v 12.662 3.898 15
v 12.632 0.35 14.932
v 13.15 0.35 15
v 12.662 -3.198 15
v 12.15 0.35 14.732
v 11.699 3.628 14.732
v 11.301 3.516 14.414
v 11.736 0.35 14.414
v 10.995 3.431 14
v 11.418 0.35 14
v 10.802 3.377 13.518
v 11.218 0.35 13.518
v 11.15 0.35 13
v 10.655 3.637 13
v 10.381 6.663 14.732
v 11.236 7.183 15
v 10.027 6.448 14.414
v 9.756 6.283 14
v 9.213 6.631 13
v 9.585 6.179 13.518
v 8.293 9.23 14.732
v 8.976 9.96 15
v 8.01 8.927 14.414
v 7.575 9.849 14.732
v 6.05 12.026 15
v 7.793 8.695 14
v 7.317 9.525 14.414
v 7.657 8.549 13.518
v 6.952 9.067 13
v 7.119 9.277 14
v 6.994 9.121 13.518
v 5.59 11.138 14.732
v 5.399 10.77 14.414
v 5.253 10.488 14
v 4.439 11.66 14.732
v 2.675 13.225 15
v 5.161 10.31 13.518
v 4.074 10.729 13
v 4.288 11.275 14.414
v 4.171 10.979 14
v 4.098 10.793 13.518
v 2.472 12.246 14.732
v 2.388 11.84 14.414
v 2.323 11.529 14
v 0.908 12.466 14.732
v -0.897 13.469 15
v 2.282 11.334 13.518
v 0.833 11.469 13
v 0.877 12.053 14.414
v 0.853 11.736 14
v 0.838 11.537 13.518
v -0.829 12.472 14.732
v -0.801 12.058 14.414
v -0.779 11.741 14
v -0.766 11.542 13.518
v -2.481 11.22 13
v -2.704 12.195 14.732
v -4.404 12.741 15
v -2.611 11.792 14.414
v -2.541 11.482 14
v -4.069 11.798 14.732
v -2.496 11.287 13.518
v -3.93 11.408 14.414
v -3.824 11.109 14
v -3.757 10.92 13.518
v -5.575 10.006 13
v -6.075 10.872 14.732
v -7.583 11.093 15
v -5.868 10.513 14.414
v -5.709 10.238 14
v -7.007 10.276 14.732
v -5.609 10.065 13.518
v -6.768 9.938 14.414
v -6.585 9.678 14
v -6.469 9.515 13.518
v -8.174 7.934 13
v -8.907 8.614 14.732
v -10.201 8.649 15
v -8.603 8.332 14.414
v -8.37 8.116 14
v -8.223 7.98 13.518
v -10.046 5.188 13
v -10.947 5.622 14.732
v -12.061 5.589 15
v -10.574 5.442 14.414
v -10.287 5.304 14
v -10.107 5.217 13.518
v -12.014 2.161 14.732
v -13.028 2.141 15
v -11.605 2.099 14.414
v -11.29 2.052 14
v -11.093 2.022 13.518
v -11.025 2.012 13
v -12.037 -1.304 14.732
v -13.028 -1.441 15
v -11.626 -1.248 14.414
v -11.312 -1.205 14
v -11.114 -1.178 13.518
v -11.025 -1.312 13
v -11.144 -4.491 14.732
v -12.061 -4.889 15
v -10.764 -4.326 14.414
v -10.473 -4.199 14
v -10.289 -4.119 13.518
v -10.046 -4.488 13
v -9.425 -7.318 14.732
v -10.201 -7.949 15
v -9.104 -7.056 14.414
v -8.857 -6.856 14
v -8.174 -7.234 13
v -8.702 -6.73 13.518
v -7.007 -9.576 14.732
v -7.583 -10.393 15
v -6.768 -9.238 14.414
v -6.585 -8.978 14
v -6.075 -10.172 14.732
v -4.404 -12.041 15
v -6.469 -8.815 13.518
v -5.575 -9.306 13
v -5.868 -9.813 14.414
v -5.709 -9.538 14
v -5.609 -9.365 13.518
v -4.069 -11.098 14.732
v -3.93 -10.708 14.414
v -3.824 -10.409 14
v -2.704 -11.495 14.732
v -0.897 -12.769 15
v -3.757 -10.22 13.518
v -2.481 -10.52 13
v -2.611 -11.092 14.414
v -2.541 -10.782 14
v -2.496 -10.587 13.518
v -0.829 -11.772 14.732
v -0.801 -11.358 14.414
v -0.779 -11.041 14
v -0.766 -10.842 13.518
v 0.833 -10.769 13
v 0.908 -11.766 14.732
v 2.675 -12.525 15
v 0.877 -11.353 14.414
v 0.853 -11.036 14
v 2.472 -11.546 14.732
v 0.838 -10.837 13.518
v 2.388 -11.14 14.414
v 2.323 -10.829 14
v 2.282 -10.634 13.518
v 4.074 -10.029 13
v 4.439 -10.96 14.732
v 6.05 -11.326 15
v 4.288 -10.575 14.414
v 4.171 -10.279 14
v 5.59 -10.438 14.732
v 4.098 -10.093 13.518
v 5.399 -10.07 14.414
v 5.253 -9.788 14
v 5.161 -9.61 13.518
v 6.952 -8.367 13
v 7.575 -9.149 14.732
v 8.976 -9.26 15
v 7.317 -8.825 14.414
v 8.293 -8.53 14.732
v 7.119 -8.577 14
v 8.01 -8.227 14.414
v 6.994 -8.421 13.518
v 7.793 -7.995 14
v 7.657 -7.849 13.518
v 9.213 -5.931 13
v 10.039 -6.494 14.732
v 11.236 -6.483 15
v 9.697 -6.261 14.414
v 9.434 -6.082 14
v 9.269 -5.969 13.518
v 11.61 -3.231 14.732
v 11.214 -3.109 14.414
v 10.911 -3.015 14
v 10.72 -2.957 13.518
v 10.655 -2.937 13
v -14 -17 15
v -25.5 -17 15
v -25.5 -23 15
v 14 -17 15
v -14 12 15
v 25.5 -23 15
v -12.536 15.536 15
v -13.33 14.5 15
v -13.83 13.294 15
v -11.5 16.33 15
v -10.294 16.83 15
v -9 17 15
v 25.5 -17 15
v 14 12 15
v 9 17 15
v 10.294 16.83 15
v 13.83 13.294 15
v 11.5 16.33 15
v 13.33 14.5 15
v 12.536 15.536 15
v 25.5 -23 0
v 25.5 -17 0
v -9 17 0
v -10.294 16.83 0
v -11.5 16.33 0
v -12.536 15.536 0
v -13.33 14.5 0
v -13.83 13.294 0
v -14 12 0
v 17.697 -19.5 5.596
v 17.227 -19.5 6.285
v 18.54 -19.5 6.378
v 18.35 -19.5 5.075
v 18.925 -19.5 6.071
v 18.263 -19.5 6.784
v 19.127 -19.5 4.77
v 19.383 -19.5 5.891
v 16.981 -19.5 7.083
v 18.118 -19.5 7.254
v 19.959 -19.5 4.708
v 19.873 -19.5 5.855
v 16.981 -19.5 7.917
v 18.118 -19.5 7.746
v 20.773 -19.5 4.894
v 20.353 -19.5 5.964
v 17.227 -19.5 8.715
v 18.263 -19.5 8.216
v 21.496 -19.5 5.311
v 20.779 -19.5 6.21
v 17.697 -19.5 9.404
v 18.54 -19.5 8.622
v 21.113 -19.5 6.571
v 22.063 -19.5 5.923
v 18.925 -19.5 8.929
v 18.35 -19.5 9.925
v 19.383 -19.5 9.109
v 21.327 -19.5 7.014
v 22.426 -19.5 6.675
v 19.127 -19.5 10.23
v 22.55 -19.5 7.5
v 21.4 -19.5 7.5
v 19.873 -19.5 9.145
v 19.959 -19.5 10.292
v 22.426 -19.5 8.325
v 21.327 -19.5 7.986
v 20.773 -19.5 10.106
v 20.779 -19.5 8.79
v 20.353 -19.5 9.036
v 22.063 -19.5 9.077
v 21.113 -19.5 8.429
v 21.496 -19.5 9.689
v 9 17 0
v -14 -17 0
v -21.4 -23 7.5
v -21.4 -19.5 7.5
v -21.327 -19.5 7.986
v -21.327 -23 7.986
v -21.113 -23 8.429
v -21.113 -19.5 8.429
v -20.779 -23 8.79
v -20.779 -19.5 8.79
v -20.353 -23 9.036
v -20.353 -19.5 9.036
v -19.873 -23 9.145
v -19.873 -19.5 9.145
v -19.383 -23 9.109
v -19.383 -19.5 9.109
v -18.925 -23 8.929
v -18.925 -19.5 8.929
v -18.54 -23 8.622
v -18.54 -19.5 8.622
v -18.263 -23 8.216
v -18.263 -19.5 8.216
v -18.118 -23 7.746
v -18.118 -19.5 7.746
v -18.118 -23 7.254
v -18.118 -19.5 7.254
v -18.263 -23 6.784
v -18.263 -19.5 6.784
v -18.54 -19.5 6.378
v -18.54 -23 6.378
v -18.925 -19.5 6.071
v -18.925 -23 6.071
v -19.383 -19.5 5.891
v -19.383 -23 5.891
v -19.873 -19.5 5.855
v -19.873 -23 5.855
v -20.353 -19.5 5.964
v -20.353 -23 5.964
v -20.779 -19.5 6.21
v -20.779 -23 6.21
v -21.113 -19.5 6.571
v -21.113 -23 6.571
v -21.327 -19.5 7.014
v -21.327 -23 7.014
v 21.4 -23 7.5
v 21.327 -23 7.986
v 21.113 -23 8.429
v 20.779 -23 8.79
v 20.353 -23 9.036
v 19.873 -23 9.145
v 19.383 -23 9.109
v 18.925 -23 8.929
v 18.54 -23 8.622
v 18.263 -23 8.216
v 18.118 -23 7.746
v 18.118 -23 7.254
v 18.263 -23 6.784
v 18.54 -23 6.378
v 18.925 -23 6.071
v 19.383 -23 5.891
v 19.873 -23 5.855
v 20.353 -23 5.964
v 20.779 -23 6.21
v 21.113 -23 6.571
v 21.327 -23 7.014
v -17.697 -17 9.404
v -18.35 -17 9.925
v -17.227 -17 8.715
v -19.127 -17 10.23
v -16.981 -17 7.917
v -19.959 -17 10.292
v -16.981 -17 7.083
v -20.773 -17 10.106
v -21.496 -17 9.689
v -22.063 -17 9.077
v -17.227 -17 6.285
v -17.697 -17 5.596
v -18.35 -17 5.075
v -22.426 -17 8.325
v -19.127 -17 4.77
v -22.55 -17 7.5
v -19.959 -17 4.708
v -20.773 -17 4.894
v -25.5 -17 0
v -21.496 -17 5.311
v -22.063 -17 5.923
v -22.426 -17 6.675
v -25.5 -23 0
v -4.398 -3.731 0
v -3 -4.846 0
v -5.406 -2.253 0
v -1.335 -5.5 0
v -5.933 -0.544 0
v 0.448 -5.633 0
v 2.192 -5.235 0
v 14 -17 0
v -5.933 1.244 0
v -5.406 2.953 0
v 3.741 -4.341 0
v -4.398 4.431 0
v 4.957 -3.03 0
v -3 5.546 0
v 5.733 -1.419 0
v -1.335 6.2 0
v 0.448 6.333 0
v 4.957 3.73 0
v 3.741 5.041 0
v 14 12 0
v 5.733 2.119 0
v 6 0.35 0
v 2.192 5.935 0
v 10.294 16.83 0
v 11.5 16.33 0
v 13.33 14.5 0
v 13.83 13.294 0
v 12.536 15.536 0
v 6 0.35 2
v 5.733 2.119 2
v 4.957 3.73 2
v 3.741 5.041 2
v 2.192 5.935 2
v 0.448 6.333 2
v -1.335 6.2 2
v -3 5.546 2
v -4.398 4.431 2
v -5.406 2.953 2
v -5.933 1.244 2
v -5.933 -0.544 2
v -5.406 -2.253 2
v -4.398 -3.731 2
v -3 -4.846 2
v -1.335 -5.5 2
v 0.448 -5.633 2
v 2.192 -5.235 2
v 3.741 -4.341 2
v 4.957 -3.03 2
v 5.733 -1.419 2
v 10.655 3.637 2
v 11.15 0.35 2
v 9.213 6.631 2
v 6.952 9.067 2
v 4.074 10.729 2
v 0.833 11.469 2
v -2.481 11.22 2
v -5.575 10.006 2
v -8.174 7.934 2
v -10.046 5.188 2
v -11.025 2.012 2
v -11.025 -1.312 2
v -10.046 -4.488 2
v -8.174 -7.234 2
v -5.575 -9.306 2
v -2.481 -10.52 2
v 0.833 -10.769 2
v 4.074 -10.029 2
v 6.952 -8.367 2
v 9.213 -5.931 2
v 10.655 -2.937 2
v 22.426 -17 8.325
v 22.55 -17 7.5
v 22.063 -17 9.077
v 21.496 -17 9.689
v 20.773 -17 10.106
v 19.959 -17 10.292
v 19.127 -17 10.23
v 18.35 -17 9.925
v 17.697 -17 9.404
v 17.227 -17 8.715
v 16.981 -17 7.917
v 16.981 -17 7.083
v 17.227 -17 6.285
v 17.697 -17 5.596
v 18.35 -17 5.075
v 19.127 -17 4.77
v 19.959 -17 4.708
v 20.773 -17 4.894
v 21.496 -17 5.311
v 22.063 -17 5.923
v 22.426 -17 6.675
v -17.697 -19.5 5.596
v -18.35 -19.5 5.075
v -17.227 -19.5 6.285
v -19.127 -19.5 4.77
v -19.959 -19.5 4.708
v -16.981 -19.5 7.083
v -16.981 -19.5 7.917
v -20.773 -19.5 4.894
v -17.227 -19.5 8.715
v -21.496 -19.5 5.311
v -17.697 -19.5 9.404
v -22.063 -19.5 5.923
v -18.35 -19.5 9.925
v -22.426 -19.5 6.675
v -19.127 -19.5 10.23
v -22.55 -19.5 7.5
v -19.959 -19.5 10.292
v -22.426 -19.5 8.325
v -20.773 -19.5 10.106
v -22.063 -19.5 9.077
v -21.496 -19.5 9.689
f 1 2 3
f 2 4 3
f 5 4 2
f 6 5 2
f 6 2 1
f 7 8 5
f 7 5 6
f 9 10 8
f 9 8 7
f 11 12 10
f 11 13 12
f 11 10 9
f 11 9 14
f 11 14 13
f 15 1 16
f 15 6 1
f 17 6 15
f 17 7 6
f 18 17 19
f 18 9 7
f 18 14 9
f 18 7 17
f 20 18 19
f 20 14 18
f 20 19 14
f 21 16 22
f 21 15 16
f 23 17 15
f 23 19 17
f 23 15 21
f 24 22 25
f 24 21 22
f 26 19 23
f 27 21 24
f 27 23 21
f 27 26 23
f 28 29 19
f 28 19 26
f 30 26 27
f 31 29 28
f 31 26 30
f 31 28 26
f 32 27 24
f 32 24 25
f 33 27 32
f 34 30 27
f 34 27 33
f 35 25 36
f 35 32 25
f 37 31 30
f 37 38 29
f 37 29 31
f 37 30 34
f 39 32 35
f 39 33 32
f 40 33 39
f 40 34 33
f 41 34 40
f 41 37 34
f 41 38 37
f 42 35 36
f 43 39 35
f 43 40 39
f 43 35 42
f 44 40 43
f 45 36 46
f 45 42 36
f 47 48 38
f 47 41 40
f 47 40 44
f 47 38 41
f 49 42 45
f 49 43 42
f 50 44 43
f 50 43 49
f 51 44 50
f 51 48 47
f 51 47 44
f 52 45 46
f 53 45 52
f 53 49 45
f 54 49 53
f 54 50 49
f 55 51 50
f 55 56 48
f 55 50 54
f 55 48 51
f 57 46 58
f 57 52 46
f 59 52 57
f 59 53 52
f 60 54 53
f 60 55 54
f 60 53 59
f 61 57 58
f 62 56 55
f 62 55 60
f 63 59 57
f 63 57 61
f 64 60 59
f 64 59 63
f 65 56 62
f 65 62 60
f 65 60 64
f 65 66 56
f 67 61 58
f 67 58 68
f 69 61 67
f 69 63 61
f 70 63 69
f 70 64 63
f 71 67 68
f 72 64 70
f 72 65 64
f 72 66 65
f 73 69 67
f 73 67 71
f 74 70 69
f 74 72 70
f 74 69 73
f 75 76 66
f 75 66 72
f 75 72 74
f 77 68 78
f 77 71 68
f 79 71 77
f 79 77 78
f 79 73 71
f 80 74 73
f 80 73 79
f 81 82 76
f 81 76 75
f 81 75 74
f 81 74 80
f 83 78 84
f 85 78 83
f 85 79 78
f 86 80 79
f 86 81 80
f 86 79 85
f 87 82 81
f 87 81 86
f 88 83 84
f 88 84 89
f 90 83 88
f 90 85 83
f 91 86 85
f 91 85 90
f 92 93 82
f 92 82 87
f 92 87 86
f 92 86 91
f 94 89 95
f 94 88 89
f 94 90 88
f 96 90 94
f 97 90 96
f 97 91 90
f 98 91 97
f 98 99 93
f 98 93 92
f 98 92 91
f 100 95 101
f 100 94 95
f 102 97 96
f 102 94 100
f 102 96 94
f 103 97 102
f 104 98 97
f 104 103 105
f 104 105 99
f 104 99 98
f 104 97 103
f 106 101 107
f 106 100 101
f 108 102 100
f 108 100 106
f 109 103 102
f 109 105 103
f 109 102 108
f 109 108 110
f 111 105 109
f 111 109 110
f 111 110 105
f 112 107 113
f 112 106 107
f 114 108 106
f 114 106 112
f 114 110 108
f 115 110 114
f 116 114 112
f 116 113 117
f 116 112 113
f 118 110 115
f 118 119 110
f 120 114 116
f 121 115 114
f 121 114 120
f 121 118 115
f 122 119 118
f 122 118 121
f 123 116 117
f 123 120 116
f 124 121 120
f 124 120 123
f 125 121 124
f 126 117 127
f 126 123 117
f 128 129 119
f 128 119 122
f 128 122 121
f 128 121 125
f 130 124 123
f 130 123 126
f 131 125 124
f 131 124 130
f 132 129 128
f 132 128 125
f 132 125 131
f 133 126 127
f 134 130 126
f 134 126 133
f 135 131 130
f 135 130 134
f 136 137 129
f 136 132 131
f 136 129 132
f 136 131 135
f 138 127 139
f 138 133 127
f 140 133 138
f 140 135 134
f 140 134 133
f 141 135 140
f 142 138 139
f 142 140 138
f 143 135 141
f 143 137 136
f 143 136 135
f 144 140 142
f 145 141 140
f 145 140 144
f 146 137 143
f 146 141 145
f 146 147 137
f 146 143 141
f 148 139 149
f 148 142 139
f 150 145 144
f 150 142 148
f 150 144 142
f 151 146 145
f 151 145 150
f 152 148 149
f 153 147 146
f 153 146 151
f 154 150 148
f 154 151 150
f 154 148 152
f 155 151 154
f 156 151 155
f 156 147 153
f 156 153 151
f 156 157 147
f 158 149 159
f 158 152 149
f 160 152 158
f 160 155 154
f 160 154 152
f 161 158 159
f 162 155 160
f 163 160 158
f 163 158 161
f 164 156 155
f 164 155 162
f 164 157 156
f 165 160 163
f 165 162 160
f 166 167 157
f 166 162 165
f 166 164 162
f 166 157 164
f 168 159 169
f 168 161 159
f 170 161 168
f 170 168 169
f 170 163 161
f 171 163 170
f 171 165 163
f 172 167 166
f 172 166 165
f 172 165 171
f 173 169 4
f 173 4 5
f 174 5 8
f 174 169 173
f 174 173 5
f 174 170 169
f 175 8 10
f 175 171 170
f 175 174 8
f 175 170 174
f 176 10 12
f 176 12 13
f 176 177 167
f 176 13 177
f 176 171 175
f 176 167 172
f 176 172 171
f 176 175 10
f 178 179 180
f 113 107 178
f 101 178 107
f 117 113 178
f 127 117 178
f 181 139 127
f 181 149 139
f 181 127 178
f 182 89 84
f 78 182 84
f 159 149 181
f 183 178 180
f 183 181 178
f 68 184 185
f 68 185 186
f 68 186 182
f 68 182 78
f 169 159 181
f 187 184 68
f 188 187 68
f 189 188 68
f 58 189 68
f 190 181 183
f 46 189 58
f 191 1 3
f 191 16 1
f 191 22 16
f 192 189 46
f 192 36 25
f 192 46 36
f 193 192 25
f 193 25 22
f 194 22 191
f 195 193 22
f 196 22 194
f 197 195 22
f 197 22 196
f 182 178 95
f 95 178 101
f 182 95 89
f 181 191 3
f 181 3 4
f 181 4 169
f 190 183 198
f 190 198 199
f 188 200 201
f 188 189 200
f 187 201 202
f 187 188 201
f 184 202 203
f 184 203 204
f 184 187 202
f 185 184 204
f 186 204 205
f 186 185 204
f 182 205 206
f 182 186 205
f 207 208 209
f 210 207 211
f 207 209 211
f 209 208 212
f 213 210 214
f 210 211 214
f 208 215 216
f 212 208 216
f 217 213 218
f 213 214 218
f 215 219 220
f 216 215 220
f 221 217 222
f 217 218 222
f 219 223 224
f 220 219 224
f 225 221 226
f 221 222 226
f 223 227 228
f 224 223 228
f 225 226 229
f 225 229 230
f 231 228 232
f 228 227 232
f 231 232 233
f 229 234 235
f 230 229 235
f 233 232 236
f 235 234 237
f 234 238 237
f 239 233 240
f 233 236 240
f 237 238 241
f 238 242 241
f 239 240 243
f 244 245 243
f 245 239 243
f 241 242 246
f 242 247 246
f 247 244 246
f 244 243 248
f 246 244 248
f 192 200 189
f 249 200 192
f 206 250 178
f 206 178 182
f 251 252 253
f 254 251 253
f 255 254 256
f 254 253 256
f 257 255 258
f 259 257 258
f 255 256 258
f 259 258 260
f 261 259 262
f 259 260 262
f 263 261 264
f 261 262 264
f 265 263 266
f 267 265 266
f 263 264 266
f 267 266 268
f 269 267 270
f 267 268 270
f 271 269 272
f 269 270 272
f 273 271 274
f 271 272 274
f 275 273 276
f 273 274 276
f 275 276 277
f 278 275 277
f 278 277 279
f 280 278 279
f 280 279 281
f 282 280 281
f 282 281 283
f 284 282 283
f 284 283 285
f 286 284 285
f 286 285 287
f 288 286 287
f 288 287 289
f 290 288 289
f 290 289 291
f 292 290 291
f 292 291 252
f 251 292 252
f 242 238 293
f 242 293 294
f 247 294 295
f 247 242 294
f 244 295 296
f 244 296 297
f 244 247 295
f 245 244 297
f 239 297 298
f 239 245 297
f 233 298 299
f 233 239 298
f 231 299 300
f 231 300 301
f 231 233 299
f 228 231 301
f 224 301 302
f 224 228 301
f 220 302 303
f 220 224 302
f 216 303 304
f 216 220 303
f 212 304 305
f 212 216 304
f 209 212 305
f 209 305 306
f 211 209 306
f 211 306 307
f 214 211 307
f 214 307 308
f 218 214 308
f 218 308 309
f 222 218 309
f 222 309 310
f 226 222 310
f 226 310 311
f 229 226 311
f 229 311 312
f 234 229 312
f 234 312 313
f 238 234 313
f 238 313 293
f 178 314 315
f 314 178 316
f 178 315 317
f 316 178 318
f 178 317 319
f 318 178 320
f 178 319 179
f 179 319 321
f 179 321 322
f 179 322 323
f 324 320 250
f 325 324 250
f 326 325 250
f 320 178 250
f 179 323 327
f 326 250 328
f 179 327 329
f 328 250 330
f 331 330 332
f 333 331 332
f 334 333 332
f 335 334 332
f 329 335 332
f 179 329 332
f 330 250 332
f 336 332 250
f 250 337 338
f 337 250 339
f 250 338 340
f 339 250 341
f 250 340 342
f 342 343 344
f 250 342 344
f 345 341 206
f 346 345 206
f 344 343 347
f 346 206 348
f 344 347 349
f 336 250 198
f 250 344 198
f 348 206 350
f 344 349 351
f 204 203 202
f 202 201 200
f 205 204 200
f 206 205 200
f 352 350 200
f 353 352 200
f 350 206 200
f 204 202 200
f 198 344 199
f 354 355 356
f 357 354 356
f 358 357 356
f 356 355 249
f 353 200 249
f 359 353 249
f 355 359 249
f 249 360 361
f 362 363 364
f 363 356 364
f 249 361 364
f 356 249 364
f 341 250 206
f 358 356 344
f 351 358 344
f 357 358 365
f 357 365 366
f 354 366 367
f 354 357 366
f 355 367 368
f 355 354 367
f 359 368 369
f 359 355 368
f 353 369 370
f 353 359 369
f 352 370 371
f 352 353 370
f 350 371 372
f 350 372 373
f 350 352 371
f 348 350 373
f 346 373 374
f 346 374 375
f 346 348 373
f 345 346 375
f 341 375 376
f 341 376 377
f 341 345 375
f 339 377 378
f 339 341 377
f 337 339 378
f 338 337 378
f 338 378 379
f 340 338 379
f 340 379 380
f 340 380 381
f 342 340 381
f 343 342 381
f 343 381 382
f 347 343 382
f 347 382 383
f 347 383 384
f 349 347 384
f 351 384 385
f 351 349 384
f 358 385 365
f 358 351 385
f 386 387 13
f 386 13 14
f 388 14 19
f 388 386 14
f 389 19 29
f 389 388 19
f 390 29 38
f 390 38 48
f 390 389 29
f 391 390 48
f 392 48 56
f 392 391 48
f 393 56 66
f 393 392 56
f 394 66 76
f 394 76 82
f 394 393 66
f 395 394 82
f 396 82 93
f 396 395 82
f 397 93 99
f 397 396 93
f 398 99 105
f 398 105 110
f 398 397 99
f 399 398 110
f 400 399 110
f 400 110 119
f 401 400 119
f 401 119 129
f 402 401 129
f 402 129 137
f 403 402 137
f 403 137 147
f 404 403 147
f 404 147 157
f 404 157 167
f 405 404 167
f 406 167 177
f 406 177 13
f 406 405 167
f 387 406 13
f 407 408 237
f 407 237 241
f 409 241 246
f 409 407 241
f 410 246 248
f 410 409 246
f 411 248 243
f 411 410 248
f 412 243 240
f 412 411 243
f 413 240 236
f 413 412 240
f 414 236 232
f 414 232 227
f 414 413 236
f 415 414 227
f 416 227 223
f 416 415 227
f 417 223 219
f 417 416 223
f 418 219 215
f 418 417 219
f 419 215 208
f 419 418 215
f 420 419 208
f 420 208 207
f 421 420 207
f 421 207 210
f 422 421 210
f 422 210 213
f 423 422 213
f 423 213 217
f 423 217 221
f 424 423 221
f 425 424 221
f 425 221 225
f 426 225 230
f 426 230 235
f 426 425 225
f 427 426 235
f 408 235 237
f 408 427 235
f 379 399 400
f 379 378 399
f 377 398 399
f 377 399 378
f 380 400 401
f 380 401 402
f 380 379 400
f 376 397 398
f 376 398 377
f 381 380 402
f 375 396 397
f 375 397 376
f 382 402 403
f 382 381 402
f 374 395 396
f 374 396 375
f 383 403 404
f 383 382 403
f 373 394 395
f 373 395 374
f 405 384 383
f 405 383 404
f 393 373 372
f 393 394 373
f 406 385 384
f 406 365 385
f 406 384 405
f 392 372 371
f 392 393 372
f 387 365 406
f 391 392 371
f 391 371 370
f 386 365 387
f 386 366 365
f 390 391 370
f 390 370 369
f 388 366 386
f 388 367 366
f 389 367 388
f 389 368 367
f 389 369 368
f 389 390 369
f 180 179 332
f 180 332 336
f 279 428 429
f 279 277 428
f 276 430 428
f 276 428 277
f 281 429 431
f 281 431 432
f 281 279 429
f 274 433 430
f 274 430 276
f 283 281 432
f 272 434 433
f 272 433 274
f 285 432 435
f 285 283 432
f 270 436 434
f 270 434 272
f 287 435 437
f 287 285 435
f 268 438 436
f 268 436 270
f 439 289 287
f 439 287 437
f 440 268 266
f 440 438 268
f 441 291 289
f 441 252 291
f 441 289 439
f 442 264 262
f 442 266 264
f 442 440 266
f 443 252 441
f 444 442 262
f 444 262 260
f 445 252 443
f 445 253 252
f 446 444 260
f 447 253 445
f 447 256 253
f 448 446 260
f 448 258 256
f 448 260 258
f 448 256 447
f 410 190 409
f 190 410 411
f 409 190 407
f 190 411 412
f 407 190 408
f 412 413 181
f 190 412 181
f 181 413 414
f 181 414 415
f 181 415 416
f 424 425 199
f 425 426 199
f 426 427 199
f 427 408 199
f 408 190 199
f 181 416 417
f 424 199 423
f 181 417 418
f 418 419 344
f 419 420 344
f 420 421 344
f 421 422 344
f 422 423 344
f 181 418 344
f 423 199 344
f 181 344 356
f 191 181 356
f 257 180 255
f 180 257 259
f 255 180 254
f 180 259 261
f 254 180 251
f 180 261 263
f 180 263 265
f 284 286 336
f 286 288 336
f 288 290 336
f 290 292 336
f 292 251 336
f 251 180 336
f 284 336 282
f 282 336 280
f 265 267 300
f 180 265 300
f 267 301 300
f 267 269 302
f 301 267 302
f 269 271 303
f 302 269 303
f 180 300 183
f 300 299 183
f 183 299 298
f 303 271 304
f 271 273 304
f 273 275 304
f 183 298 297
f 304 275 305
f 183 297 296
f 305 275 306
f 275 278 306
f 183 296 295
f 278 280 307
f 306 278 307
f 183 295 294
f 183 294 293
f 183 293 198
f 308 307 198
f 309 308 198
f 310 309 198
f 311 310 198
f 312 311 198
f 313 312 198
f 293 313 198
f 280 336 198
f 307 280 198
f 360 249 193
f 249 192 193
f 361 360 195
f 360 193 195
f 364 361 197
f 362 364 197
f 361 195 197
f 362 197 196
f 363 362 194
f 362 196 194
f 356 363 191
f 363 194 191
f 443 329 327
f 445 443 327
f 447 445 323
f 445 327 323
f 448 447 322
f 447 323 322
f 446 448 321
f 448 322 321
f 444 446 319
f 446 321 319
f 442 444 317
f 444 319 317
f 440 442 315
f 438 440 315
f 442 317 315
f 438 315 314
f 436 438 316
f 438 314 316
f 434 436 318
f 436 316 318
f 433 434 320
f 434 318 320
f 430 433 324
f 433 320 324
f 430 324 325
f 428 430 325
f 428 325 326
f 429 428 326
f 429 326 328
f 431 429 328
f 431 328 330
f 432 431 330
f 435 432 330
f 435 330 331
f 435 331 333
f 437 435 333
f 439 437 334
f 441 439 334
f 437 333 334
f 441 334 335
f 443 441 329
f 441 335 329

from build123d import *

# Parameters (mm, degrees)
F0_W     = 28
F0_H     = 34
F0_R     = 11.15
F1_DEPTH = 15
F0_R_2   = 6
F2_DEPTH = 2
F3_R     = 1.65
F4_DEPTH = 6
F3_R_2   = 2.8
F5_DEPTH = 2.5
F7_R     = 5
F8_R     = 2


with BuildPart() as f1:
    # F0 (on Top) → F1 (new body)
    with BuildSketch(Plane.XY):
        Rectangle(F0_W, F0_H)
        with Locations((0, 0.35)):
            Circle(F0_R, mode=Mode.SUBTRACT)
        Polygon((14, -17), (-14, -17), (-25.5, -17), (-25.5, -23), (25.5, -23), (25.5, -17), align=None)
    extrude(amount=F1_DEPTH)

    # F0 (on Top) → F2 (join)
    with BuildSketch(Plane.XY):
        with Locations((0, 0.35)):
            Circle(F0_R)
        with Locations((0, 0.35)):
            Circle(F0_R_2, mode=Mode.SUBTRACT)
    extrude(amount=F2_DEPTH)

    # F3 (on face) → F4 (cut, through all)
    with BuildSketch(Plane(origin=(0, -17, 0), x_dir=(-1, 0, 0), z_dir=(0, 1, 0))):
        with Locations((19.75, 7.5)):
            Circle(F3_R)
    extrude(amount=-F4_DEPTH, mode=Mode.SUBTRACT)

    # F3 (on face) → F5 (cut)
    with BuildSketch(Plane(origin=(0, -17, 0), x_dir=(-1, 0, 0), z_dir=(0, 1, 0))):
        with Locations((19.75, 7.5)):
            Circle(F3_R_2)
        with Locations((19.75, 7.5)):
            Circle(F3_R, mode=Mode.SUBTRACT)
    extrude(amount=-F5_DEPTH, mode=Mode.SUBTRACT)

    # F6: F1 across plane


with BuildPart() as f1_1:
    add(f1.part)
    add(f1.part.mirror(Plane.YZ), mode=Mode.INTERSECT)

    # F7
    f7_edges = [f1_1.edges().sort_by_distance(p)[0] for p in [
        (-14, 17, 7.5),
        (14, 17, 7.5),
    ]]
    fillet(f7_edges, radius=F7_R)

    # F8
    f8_edges = [f1_1.edges().sort_by_distance(p)[0] for p in [
        (-11.15, 0.35, 15),
    ]]
    fillet(f8_edges, radius=F8_R)


solid = f1_1.part
